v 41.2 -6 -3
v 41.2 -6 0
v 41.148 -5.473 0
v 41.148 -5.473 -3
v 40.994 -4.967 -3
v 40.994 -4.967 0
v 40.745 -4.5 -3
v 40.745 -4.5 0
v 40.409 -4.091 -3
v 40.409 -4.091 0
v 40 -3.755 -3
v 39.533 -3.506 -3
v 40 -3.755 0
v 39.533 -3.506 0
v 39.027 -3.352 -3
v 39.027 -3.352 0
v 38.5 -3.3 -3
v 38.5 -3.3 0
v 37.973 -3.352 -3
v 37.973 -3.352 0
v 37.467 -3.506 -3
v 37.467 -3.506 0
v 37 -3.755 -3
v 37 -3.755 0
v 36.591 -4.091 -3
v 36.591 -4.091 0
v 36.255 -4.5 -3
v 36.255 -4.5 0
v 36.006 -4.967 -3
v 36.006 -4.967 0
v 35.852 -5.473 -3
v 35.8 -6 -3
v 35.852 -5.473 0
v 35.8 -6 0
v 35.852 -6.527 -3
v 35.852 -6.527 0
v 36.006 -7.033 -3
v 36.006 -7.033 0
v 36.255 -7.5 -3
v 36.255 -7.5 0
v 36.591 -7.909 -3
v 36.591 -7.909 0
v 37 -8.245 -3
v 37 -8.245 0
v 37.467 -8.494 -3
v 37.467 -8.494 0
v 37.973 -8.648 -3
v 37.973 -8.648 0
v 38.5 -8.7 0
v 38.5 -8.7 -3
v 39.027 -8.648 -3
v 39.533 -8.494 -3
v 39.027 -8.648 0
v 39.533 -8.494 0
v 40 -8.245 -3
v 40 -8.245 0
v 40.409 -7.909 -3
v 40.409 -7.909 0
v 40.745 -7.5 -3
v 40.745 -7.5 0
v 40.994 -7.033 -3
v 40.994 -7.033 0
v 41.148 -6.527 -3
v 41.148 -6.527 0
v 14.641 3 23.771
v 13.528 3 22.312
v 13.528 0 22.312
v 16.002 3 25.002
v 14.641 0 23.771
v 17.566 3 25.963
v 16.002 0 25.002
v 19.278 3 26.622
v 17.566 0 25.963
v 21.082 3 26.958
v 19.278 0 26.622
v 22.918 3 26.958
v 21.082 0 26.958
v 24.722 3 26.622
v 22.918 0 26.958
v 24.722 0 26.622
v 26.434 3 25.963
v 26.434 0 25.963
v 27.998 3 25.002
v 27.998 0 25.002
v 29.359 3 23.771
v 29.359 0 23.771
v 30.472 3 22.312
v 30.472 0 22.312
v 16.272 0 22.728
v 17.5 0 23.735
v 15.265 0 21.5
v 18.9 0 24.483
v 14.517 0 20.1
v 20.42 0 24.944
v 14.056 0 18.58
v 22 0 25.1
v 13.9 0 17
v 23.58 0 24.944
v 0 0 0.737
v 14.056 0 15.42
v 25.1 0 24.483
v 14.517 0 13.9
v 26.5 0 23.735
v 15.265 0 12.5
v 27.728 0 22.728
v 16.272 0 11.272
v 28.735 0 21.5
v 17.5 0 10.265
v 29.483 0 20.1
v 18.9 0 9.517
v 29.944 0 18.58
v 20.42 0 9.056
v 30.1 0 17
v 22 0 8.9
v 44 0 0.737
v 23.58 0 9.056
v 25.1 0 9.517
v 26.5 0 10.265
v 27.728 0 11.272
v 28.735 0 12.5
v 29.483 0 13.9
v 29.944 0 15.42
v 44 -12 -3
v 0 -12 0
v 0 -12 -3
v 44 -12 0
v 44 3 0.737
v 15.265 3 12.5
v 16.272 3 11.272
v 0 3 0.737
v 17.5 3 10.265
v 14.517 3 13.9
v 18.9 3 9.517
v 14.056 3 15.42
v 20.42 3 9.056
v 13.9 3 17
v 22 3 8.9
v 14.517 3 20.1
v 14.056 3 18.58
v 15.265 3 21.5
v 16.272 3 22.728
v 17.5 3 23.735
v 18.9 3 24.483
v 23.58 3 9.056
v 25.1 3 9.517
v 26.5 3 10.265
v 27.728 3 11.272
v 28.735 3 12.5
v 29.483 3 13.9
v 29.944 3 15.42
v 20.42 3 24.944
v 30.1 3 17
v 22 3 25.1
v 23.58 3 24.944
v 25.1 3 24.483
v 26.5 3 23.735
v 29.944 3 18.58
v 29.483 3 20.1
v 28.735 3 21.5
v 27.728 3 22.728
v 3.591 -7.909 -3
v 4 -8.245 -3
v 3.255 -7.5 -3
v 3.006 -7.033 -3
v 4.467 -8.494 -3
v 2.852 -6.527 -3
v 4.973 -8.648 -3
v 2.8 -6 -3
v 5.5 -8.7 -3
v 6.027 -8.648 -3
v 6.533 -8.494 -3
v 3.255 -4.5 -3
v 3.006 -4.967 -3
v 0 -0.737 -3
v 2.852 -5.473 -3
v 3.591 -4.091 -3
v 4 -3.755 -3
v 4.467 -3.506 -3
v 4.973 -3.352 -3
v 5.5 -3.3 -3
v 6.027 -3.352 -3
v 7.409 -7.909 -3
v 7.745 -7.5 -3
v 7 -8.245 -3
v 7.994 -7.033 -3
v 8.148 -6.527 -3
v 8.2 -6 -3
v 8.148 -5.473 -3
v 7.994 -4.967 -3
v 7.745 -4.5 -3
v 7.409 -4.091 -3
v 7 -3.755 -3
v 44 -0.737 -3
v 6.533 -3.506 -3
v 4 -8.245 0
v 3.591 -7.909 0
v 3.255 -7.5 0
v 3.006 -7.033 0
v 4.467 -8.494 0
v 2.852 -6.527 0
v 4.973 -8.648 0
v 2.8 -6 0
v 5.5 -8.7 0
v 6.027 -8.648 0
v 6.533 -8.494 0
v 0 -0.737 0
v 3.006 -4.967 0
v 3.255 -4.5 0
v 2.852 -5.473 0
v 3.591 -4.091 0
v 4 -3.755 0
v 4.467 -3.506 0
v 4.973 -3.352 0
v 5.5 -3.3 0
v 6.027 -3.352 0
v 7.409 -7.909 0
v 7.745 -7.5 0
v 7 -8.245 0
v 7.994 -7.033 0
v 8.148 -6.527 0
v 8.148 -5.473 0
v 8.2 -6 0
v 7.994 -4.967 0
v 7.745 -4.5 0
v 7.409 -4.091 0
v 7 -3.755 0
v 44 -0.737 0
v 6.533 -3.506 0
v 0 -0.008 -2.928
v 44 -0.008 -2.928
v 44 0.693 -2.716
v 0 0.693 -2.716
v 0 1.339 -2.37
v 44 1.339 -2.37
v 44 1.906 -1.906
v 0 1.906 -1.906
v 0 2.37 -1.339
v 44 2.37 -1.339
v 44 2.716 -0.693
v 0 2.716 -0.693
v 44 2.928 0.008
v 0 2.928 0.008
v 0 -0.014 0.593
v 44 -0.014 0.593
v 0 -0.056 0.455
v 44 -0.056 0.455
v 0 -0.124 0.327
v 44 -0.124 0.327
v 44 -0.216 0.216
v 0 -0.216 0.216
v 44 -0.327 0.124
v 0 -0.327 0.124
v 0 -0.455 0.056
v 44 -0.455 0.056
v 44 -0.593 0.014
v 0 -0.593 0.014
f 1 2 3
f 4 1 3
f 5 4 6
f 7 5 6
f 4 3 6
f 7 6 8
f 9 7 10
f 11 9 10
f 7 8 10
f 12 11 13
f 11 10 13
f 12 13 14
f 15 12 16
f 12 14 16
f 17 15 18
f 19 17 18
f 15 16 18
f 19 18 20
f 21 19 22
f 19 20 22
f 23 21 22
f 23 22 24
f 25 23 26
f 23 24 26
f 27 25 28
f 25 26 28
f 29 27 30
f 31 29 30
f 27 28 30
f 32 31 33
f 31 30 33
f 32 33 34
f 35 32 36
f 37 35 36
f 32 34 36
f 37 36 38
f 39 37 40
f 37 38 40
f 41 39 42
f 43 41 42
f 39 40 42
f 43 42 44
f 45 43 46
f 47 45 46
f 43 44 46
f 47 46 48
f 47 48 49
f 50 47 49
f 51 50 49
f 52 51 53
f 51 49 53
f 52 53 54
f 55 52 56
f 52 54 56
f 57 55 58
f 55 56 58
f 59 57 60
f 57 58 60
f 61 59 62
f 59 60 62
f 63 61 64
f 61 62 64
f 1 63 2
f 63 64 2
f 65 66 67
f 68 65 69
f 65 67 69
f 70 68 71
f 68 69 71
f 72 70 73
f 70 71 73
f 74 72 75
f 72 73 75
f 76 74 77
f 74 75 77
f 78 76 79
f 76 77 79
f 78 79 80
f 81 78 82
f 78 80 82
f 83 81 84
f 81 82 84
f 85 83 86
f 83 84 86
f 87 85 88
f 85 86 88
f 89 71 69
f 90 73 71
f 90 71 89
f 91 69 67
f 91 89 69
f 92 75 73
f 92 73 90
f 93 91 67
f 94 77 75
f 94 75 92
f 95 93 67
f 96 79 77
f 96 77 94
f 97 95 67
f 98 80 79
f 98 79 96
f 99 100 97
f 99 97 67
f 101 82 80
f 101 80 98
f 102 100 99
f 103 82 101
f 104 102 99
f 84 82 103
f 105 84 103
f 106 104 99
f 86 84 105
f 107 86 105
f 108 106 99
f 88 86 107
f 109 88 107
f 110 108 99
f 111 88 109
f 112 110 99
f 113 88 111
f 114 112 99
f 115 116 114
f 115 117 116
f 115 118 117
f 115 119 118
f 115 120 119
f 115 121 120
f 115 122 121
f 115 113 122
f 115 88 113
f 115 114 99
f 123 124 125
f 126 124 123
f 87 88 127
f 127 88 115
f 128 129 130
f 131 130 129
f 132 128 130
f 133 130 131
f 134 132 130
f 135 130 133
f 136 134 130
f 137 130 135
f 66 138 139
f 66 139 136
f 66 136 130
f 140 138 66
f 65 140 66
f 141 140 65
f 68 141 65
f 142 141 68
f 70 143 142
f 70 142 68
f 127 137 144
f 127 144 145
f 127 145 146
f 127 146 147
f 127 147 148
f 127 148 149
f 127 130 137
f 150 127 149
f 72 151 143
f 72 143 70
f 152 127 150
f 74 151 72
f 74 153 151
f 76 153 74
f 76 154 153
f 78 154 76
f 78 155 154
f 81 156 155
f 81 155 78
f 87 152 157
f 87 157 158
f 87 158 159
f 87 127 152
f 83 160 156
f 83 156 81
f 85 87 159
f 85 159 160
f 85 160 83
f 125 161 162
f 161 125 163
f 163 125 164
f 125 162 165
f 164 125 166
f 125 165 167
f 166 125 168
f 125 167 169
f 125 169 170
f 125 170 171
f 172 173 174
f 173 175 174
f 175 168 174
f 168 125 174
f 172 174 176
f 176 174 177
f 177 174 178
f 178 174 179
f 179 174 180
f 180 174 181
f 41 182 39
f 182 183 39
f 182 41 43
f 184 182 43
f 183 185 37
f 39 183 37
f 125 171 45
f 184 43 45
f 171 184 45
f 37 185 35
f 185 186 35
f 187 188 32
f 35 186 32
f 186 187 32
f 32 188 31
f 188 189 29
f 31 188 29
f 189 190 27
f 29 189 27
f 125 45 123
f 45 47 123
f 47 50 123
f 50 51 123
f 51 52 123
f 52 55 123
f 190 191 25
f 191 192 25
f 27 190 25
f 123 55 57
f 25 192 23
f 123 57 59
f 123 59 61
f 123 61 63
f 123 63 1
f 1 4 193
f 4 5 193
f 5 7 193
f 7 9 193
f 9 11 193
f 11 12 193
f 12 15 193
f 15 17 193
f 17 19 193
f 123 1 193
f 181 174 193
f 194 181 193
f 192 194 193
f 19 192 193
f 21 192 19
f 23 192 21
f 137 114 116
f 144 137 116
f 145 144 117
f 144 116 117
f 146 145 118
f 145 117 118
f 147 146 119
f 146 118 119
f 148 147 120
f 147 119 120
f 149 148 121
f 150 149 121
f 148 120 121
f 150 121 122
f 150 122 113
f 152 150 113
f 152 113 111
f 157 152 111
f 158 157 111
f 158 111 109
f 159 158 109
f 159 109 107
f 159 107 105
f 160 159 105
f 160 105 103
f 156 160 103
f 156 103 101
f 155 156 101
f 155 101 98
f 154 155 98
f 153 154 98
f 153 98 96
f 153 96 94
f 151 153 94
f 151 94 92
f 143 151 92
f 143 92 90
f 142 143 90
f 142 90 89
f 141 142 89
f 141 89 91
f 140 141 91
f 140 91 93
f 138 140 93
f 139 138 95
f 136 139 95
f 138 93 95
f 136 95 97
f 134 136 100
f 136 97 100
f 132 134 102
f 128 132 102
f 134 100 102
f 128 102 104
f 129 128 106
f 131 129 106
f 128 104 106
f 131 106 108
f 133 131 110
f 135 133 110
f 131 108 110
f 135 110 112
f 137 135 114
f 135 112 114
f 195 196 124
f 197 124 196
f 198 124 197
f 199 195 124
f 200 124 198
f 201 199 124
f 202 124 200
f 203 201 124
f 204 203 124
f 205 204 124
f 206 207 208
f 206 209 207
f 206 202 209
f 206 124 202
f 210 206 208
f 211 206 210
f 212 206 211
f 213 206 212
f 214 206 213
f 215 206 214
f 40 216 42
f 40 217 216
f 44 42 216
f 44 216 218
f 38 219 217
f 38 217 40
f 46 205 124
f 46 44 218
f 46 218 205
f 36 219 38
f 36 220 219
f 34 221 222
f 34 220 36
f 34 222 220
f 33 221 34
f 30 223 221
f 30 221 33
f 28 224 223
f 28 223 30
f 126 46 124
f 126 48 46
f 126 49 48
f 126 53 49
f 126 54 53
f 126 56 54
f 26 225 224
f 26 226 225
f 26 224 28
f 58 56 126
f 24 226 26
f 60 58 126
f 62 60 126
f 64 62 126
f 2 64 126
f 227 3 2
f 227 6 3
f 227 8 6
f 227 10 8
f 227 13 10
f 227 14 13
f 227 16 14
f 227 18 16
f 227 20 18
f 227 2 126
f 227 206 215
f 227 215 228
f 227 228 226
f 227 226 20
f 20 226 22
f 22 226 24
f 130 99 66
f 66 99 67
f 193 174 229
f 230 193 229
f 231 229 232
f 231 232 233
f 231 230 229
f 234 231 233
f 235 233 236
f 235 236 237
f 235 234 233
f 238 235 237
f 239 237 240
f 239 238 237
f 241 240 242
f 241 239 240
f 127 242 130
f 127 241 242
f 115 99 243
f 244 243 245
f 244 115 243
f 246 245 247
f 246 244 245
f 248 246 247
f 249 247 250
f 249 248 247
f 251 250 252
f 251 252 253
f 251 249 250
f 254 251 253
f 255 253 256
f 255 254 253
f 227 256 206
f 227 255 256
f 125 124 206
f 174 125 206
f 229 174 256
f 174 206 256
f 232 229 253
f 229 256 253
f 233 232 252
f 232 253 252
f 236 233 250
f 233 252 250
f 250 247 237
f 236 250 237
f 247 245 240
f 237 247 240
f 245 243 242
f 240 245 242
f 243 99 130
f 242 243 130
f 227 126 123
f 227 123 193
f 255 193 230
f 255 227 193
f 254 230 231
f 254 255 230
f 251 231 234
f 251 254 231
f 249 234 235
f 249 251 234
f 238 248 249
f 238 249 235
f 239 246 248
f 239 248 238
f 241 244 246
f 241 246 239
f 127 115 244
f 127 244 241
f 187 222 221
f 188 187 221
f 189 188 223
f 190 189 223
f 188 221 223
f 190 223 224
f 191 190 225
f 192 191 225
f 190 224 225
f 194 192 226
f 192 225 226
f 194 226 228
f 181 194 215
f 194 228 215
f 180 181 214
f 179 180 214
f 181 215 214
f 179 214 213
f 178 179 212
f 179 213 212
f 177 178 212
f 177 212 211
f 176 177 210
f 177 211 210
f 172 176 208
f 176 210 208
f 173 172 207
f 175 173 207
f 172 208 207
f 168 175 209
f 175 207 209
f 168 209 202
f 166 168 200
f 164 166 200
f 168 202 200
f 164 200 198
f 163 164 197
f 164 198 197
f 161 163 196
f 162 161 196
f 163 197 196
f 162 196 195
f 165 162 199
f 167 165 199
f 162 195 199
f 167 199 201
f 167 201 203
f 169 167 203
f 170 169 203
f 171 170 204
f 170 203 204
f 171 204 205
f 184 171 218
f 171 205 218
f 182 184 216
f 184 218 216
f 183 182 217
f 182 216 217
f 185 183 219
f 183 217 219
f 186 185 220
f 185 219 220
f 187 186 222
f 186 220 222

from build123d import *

# Parameters (mm, degrees)
SKETCH2_W                    = 44
SKETCH2_H                    = 12
SKETCH2_R                    = 2.7
BASE_FLANGE1_DEPTH           = 3
EDGE_FLANGE1_STRIP_W         = 13.4732
EDGE_FLANGE1_STRIP_H         = 3
EDGE_FLANGE1_STRIP_CUT_DEPTH = 44
EDGE_FLANGE1_DEPTH           = 44
CUT_EXTRUDE1_DEPTH           = 10
SKETCH11_R                   = 8.1
CUT_EXTRUDE2_DEPTH           = 10


# Sheet-metal steps are written as plain solids
with BuildPart() as part:
    # Sketch2 → Base-Flange1 (new body)
    with BuildSketch(Plane.XY):
        with Locations((22, -6)):
            Rectangle(SKETCH2_W, SKETCH2_H)
        with Locations((5.5, -6)):
            Circle(SKETCH2_R, mode=Mode.SUBTRACT)
        with Locations((38.5, -6)):
            Circle(SKETCH2_R, mode=Mode.SUBTRACT)
    extrude(amount=-BASE_FLANGE1_DEPTH)

    # Edge-Flange1 strip (across the edge) → Edge-Flange1 strip cut (cut)
    with BuildSketch(Plane(origin=(44, 0, 0), x_dir=(0, -1, 0), z_dir=(-1, 0, 0))):
        with Locations((-6, -1.5)):
            Rectangle(EDGE_FLANGE1_STRIP_W, EDGE_FLANGE1_STRIP_H)
    extrude(amount=EDGE_FLANGE1_STRIP_CUT_DEPTH, mode=Mode.SUBTRACT)

    # Edge-Flange1 section (across the edge) → Edge-Flange1 (add)
    with BuildSketch(Plane(origin=(44, 0, 0), x_dir=(0, -1, 0), z_dir=(-1, 0, 0))):
        with BuildLine():
            Line((-3, 0.7366), (-3, 29.1))
            Line((-3, 29.1), (0, 29.1))
            Line((0, 29.1), (0, 0.7366))
            ThreePointArc((0, 0.7366), (0.215745145, 0.215745145), (0.7366, 0))
            Line((0.7366, 0), (0.7366, -3))
            ThreePointArc((0.7366, -3), (-1.905575199, -1.905575199), (-3, 0.7366))
        make_face()
    extrude(amount=EDGE_FLANGE1_DEPTH)

    # Sketch10 → Cut-Extrude1 (cut)
    with BuildSketch(Plane.XZ):
        with BuildLine():
            Line((0, 0.7366), (13.527598835, 22.312101137))
            ThreePointArc((13.527598835, 22.312101137), (22, 27), (30.472401165, 22.312101137))
            Line((30.472401165, 22.312101137), (44, 0.7366))
            Line((44, 0.7366), (48.421398218, 0.7366))
            Line((48.421398218, 0.7366), (48.421398218, 35.108579441))
            Line((48.421398218, 35.108579441), (-4.285342107, 35.108579441))
            Line((-4.285342107, 35.108579441), (-4.285342107, 0.7366))
            Line((-4.285342107, 0.7366), (0, 0.7366))
        make_face()
    extrude(amount=-CUT_EXTRUDE1_DEPTH, mode=Mode.SUBTRACT)

    # Sketch11 → Cut-Extrude2 (cut)
    with BuildSketch(Plane.XZ):
        with Locations(Location((22, 17, 0), (0, 0, 270))):
            Circle(SKETCH11_R)
    extrude(amount=-CUT_EXTRUDE2_DEPTH, mode=Mode.SUBTRACT)


solid = part.part
